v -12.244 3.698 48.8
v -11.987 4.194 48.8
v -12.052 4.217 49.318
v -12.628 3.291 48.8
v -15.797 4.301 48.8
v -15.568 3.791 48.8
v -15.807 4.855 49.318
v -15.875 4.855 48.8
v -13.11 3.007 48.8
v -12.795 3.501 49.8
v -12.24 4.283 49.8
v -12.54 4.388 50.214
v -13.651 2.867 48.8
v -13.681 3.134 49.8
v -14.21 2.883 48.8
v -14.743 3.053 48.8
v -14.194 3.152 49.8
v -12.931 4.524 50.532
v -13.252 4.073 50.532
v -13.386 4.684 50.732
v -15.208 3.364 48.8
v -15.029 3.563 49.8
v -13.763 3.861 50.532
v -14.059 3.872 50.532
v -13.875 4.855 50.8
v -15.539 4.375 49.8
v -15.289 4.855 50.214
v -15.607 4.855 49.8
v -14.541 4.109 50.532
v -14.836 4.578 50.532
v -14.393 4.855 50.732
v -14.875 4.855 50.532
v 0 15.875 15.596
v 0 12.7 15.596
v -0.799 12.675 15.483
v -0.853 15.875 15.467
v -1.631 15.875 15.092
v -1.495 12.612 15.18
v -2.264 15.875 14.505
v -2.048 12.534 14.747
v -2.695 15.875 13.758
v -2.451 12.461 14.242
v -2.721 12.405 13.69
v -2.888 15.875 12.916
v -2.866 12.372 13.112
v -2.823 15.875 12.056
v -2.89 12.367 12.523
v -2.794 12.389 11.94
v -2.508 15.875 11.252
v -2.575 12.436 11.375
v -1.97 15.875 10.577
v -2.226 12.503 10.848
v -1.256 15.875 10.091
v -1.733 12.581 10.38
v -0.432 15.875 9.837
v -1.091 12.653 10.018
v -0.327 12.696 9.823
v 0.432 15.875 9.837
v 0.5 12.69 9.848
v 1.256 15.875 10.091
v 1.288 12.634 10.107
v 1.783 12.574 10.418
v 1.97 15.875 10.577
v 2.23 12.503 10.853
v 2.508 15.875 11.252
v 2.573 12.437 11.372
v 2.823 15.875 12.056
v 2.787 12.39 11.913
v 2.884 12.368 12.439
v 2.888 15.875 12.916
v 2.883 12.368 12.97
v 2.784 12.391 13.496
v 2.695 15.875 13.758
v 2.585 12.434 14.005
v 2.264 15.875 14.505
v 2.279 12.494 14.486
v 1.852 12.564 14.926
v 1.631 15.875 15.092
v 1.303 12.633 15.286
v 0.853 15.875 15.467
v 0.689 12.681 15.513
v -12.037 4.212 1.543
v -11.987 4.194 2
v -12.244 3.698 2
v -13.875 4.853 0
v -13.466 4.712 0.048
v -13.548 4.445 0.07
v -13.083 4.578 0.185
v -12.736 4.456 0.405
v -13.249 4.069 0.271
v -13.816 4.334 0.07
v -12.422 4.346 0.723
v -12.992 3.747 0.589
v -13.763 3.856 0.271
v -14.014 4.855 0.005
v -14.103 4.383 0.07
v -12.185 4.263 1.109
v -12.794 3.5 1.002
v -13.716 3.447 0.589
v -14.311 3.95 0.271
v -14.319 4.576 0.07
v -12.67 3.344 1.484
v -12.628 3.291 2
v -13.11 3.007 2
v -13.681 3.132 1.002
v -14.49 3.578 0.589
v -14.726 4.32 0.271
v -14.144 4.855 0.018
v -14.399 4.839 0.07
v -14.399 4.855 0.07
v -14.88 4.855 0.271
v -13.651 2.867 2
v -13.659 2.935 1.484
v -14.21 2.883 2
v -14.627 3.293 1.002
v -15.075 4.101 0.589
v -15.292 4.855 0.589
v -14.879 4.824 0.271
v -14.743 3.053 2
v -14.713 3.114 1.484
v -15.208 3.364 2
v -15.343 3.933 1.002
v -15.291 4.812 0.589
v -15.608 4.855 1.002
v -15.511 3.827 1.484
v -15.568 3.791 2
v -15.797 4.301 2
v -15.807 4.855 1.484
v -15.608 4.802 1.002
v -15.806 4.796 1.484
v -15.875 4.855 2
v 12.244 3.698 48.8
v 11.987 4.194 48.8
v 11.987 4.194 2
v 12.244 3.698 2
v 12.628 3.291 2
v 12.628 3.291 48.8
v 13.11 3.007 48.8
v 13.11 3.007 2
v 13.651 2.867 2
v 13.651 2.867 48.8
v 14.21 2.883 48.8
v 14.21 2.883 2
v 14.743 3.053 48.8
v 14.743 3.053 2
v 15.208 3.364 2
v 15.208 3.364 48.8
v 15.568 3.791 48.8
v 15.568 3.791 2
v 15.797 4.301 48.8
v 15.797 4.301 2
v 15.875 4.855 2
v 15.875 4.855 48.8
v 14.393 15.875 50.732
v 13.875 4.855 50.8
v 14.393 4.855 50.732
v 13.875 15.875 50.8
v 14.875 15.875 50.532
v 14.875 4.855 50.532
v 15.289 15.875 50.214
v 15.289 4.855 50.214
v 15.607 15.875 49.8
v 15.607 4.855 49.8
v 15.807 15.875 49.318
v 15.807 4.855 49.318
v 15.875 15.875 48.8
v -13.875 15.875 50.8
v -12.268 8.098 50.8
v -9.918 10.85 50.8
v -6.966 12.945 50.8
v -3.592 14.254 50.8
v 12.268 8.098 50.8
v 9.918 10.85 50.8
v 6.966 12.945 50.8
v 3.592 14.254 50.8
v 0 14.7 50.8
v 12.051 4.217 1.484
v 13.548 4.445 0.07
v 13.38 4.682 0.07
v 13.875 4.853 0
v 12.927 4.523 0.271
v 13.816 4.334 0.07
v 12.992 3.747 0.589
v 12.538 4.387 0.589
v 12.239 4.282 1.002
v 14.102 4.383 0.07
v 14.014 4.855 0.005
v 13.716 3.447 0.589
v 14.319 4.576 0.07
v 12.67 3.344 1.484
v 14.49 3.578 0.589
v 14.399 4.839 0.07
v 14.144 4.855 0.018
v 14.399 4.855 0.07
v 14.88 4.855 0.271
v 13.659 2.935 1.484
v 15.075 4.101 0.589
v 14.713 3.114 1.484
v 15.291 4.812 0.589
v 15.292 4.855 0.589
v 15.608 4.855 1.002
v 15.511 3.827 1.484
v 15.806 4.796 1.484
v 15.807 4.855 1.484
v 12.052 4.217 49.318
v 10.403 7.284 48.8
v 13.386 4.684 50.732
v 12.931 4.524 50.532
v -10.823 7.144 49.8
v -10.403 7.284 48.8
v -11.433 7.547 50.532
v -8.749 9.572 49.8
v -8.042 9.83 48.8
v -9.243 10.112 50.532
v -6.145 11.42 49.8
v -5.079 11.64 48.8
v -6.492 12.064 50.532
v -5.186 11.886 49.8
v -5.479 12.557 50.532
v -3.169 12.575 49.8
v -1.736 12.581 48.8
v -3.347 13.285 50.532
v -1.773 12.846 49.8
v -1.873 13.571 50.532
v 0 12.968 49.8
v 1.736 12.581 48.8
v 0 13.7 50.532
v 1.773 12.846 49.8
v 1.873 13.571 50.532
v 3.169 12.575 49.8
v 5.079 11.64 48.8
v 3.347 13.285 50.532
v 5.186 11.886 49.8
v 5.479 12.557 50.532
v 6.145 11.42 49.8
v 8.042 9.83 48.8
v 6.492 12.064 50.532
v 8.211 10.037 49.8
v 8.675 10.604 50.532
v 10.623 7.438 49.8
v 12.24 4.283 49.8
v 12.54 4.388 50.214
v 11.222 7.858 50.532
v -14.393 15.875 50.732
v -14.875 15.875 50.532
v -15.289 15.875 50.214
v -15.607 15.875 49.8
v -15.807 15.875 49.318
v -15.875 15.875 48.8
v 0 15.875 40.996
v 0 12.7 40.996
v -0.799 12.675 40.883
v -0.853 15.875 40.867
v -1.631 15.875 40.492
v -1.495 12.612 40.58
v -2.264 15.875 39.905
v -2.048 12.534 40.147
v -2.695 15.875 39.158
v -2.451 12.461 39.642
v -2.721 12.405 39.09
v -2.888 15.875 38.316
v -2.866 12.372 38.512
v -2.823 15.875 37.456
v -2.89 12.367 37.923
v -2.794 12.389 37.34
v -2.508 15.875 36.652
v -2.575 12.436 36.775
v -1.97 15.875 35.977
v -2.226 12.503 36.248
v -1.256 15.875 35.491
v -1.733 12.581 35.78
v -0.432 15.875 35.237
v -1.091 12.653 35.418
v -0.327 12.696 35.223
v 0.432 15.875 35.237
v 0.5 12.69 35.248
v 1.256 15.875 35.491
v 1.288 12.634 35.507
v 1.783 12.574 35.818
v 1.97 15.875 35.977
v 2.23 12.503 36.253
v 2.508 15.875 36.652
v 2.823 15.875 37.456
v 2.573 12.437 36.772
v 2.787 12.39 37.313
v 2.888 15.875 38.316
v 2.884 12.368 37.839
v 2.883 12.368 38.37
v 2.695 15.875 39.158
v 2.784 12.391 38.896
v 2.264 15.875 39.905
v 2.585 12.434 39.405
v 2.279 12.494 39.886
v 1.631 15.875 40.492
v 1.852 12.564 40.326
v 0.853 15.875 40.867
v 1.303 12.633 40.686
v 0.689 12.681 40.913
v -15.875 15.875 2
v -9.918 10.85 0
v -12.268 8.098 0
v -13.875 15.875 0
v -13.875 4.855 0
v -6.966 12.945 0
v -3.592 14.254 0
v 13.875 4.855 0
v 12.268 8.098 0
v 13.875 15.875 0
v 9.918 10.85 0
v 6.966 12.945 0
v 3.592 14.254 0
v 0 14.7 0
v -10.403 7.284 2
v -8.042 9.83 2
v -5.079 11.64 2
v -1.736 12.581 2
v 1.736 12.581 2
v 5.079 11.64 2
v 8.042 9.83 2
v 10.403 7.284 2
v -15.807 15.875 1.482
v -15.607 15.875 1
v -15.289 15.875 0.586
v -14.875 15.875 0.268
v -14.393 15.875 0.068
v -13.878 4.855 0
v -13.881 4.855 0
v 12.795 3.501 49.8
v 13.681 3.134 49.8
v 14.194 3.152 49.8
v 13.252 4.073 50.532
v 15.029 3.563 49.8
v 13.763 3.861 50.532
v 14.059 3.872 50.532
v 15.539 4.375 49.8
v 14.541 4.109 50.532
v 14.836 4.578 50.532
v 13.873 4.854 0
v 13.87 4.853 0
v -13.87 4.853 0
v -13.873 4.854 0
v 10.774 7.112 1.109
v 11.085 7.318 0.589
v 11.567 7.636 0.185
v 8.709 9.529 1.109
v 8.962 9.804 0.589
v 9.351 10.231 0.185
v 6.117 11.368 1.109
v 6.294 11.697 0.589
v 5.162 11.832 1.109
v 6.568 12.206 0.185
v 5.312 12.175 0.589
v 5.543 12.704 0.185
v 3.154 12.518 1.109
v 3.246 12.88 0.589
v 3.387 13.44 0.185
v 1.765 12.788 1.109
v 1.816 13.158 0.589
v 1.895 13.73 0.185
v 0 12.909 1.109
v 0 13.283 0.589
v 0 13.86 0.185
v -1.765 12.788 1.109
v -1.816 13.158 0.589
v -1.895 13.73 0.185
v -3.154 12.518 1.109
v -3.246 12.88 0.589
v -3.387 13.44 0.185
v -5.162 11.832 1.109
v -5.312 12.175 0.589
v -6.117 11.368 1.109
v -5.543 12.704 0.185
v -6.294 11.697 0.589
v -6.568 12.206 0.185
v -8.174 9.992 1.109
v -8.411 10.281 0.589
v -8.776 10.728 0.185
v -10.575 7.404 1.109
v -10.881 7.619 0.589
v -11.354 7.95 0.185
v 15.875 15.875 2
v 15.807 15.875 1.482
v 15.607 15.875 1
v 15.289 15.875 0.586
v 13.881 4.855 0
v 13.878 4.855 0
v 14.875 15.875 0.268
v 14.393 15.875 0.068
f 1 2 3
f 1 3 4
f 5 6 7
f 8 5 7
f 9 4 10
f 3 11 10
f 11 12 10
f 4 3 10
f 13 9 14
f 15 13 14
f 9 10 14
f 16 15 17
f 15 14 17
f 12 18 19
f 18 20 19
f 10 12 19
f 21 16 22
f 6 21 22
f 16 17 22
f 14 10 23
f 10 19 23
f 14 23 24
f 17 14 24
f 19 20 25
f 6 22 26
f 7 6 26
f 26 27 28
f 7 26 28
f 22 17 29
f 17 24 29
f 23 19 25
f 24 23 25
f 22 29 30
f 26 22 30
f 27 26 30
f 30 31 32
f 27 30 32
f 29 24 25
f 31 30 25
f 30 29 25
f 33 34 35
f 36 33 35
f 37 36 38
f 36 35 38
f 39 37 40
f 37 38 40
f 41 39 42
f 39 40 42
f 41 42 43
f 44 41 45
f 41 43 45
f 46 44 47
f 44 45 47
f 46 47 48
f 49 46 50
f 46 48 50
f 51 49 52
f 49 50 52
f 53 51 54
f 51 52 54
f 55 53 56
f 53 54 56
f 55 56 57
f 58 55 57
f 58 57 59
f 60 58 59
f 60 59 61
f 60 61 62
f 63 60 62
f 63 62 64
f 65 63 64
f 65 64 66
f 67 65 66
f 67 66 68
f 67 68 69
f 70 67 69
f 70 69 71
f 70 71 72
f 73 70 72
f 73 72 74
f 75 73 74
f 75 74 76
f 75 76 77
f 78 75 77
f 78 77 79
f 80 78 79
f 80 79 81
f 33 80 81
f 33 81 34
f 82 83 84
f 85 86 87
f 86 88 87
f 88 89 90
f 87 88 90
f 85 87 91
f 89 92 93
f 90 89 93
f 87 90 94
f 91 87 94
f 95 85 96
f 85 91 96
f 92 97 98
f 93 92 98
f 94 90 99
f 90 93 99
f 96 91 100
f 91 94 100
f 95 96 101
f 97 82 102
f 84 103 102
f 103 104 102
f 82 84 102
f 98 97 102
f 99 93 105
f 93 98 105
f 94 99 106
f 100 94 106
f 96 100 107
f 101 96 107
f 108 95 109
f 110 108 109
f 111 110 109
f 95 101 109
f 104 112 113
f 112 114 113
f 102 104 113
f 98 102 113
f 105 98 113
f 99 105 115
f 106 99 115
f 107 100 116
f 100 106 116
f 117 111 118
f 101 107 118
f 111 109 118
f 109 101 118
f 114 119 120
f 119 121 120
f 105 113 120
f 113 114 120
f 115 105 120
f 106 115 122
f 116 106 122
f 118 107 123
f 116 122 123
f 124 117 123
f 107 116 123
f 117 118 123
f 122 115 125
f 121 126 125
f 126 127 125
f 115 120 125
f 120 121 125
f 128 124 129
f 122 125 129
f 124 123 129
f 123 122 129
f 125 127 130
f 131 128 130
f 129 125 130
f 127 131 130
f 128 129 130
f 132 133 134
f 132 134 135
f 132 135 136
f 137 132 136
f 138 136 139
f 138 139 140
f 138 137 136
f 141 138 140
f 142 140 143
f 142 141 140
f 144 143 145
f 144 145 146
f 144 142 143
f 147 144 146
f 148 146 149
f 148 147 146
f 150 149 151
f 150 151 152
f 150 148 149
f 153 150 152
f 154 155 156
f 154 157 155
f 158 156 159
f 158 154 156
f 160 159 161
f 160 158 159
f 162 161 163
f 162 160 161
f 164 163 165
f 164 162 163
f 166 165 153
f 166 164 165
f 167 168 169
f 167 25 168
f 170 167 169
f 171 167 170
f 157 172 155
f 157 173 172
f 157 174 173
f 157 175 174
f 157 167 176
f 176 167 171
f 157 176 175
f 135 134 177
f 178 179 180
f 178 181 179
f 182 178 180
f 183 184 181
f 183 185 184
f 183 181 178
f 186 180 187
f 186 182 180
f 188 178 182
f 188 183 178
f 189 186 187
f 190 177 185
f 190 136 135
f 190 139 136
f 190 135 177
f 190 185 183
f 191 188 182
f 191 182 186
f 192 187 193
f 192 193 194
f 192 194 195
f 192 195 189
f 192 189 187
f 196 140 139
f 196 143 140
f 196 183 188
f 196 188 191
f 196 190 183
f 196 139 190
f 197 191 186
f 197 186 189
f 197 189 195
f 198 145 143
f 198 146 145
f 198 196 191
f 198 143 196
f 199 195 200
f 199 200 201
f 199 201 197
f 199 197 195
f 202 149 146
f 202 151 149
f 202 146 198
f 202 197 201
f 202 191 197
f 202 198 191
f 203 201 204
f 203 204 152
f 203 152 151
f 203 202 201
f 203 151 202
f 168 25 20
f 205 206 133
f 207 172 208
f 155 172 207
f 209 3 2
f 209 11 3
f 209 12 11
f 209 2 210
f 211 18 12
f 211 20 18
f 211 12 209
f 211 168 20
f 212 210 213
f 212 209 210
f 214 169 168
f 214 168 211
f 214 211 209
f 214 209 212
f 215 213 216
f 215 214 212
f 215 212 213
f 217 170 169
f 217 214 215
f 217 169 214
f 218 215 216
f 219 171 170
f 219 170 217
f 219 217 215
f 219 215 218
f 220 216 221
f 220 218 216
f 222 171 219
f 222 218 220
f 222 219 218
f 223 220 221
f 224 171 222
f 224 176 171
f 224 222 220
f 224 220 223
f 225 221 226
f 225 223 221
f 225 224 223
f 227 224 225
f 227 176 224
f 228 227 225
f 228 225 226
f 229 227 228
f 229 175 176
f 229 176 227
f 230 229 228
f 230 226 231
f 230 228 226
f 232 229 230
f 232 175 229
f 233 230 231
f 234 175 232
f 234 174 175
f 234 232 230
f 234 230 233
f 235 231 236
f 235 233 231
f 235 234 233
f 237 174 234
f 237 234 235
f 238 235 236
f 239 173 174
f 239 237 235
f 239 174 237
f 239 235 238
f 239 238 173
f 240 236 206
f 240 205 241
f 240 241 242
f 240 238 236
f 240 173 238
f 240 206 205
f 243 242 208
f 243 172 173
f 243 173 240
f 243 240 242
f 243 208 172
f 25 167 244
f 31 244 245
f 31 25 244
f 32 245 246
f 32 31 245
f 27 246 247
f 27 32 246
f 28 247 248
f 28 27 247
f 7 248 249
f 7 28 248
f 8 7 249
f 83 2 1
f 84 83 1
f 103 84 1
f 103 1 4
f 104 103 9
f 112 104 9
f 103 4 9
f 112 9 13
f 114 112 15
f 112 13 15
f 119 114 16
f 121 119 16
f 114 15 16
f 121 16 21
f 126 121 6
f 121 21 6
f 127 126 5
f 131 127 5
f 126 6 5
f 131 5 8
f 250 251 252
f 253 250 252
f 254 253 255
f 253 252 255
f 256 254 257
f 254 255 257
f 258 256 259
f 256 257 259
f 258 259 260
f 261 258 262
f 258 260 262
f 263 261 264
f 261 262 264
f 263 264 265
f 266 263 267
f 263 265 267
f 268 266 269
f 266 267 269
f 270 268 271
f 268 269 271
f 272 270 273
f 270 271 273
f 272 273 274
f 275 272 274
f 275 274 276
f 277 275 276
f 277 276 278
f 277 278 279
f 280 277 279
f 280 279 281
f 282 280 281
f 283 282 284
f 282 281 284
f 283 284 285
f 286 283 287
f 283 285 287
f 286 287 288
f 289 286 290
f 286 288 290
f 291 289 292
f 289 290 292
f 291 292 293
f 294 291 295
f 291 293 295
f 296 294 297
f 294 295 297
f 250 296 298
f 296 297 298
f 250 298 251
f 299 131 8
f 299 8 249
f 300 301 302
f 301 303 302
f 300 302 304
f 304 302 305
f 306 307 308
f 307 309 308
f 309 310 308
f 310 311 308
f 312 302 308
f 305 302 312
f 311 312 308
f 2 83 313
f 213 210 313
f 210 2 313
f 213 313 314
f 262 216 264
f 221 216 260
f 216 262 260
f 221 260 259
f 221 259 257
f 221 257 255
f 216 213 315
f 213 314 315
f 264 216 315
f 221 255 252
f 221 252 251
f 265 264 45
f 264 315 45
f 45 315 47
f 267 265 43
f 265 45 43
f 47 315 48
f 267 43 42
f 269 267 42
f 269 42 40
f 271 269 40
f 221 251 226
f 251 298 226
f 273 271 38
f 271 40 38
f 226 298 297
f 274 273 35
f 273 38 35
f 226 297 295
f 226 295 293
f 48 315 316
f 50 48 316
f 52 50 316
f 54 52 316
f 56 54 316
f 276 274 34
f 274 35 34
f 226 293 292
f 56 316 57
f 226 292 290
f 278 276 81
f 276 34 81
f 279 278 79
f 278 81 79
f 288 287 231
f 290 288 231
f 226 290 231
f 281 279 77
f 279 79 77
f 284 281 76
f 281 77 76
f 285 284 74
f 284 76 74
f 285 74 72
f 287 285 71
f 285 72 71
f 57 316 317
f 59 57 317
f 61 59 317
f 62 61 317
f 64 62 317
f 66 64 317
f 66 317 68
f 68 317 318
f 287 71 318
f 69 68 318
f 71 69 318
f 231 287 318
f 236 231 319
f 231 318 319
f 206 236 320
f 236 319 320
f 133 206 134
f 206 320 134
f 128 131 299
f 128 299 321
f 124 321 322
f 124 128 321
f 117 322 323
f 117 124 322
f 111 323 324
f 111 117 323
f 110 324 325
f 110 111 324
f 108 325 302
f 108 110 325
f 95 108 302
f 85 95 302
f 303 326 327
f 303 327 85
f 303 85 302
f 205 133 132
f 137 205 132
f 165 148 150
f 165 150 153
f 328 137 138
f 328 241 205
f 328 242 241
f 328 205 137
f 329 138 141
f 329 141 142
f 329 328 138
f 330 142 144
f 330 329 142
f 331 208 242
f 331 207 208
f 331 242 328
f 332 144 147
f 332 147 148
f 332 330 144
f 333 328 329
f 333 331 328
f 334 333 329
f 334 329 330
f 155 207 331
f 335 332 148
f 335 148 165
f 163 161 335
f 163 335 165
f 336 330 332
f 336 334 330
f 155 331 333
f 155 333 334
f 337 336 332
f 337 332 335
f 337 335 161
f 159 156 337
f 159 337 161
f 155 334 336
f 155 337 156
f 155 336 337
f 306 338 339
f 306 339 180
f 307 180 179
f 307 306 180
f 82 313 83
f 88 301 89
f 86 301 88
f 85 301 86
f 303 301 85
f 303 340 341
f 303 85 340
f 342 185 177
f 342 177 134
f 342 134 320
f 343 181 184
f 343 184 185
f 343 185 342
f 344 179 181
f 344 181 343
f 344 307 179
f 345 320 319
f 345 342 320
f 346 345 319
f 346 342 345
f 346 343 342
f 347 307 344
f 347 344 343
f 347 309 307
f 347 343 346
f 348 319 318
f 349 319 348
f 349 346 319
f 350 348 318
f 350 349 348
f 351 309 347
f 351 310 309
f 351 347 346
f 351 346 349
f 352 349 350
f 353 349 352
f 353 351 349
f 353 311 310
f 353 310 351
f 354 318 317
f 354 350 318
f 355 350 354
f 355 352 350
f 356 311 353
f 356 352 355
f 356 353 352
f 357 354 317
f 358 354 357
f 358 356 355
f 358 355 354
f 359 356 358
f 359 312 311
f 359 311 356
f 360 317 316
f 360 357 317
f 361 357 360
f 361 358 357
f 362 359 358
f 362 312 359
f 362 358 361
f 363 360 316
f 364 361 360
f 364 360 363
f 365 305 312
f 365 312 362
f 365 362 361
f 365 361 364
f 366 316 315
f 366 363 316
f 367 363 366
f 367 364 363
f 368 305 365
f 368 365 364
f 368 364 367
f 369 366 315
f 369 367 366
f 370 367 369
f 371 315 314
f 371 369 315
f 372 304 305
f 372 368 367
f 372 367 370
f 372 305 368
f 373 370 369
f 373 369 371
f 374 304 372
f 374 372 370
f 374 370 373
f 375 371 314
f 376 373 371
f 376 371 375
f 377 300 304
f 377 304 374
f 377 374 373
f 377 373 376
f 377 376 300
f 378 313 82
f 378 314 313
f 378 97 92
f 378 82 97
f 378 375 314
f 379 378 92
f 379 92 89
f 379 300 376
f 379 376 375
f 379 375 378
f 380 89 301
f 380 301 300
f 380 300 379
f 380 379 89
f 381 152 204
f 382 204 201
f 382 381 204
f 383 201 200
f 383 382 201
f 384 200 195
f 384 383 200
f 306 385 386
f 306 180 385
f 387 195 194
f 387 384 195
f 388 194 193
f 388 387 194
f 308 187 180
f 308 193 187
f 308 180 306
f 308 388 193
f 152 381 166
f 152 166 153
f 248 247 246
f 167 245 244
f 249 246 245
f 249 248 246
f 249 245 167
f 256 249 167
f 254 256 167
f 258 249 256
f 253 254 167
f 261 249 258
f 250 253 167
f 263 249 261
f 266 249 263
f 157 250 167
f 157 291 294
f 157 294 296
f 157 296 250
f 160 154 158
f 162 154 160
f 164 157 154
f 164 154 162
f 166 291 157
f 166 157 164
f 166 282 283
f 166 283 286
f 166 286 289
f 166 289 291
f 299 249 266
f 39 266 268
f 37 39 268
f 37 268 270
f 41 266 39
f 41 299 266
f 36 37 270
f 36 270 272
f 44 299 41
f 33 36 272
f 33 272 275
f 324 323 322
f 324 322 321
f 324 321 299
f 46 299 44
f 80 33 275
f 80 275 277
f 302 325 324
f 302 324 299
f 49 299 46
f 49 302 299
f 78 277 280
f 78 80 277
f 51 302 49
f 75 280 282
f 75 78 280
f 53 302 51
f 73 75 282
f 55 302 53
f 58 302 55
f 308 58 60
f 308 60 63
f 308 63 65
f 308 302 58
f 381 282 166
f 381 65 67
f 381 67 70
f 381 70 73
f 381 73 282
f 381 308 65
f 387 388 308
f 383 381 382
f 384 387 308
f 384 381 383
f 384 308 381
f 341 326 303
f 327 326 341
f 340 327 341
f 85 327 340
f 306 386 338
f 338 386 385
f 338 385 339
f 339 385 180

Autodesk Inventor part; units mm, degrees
ref_plane "YZ Plane" through (0, 0, 0) normal (1, 0, 0) x (0, 1, 0)
ref_plane "XZ Plane" through (0, 0, 0) normal (0, 1, 0) x (-1, 0, 0)
ref_plane "XY Plane" through (0, 0, 0) normal (0, 0, 1) x (1, 0, 0)
sketch "Sketch1" plane through (0, 0, 0) normal (0, 0, 1) x (1, 0, 0)
  circle A0 centre (0, 0) radius 12.7
  line L0 (-15.875, 15.875) -> (15.875, 15.875)
  line L1 (15.875, 15.875) -> (15.875, -15.875)
  line L2 (15.875, -15.875) -> (-15.875, -15.875)
  line L3 (-15.875, -15.875) -> (-15.875, 15.875)
  line L4 (-15.875, 15.875) -> (15.875, -15.875) construction
  line L5 (15.875, 15.875) -> (-15.875, -15.875) construction
  line L6 (-15.875, 0) -> (15.875, 0)
  point P0 (-12.7, 0)
  point P1 (12.7, 0)
  dimension "d0" = 25.4
  dimension "d1" = 31.75
  dimension "d2" = 31.75
extrude "Extrusion1" add sketch "Sketch1" along normal blind 50.8 contours A0 L6 L3 L0 L1
sketch "Sketch2" plane through (-15.875, 15.875, 0) normal (0, 1, 0) x (1, 0, 0)
  line L0 (31.75, 0) -> (0, 0) construction
  line L1 (0, 0) -> (0, -50.8) construction
  line L2 (31.75, -50.8) -> (0, -50.8) construction
  line L3 (31.75, 0) -> (31.75, -50.8) construction
  line L4 (15.875, -50.8) -> (15.875, 0)
  point P0 (15.875, -38.1)
  point P1 (15.875, -12.7)
  point P2 (15.875, -25.4)
  dimension "d7" = 25.4
  dimension "d8" = 25.4
hole "Hole1" at (0, 15.875, 38.1) at (0, 15.875, 12.7) direction (0, -1, 0) diameter 5.7912 end through all clearance for "Flat Head Machine Screw (82)" size "#12" standard "Ansi Unified Screw Threads"
fillet "Fillet1" radius 2 4 edges at (15.875, 0, 25.4) (12.7, 0, 25.4) (-15.875, 0, 25.4) (-12.7, 0, 25.4)
fillet "Fillet2" radius 2 10 edges at (-14.2101, 2.8831, 50.8) (0, 12.7, 50.8) (14.2101, 2.8831, 50.8) (15.875, 10.3649, 50.8) (-15.875, 10.3649, 50.8) (-14.2101, 2.8831, 0) (0, 12.7, 0) (14.2101, 2.8831, 0) (15.875, 10.3649, 0) (-15.875, 10.3649, 0)
equation "\"d0\" = tubeOD"
equation "\"d3\" = attachmentLength"
equation "\"d8\" = d7"
equation "\"tubeOD\" = 25.4"
equation "\"attachmentLength\" = 50.8"
properties part number "Pipe Adapter" material "ABS Plastic"
